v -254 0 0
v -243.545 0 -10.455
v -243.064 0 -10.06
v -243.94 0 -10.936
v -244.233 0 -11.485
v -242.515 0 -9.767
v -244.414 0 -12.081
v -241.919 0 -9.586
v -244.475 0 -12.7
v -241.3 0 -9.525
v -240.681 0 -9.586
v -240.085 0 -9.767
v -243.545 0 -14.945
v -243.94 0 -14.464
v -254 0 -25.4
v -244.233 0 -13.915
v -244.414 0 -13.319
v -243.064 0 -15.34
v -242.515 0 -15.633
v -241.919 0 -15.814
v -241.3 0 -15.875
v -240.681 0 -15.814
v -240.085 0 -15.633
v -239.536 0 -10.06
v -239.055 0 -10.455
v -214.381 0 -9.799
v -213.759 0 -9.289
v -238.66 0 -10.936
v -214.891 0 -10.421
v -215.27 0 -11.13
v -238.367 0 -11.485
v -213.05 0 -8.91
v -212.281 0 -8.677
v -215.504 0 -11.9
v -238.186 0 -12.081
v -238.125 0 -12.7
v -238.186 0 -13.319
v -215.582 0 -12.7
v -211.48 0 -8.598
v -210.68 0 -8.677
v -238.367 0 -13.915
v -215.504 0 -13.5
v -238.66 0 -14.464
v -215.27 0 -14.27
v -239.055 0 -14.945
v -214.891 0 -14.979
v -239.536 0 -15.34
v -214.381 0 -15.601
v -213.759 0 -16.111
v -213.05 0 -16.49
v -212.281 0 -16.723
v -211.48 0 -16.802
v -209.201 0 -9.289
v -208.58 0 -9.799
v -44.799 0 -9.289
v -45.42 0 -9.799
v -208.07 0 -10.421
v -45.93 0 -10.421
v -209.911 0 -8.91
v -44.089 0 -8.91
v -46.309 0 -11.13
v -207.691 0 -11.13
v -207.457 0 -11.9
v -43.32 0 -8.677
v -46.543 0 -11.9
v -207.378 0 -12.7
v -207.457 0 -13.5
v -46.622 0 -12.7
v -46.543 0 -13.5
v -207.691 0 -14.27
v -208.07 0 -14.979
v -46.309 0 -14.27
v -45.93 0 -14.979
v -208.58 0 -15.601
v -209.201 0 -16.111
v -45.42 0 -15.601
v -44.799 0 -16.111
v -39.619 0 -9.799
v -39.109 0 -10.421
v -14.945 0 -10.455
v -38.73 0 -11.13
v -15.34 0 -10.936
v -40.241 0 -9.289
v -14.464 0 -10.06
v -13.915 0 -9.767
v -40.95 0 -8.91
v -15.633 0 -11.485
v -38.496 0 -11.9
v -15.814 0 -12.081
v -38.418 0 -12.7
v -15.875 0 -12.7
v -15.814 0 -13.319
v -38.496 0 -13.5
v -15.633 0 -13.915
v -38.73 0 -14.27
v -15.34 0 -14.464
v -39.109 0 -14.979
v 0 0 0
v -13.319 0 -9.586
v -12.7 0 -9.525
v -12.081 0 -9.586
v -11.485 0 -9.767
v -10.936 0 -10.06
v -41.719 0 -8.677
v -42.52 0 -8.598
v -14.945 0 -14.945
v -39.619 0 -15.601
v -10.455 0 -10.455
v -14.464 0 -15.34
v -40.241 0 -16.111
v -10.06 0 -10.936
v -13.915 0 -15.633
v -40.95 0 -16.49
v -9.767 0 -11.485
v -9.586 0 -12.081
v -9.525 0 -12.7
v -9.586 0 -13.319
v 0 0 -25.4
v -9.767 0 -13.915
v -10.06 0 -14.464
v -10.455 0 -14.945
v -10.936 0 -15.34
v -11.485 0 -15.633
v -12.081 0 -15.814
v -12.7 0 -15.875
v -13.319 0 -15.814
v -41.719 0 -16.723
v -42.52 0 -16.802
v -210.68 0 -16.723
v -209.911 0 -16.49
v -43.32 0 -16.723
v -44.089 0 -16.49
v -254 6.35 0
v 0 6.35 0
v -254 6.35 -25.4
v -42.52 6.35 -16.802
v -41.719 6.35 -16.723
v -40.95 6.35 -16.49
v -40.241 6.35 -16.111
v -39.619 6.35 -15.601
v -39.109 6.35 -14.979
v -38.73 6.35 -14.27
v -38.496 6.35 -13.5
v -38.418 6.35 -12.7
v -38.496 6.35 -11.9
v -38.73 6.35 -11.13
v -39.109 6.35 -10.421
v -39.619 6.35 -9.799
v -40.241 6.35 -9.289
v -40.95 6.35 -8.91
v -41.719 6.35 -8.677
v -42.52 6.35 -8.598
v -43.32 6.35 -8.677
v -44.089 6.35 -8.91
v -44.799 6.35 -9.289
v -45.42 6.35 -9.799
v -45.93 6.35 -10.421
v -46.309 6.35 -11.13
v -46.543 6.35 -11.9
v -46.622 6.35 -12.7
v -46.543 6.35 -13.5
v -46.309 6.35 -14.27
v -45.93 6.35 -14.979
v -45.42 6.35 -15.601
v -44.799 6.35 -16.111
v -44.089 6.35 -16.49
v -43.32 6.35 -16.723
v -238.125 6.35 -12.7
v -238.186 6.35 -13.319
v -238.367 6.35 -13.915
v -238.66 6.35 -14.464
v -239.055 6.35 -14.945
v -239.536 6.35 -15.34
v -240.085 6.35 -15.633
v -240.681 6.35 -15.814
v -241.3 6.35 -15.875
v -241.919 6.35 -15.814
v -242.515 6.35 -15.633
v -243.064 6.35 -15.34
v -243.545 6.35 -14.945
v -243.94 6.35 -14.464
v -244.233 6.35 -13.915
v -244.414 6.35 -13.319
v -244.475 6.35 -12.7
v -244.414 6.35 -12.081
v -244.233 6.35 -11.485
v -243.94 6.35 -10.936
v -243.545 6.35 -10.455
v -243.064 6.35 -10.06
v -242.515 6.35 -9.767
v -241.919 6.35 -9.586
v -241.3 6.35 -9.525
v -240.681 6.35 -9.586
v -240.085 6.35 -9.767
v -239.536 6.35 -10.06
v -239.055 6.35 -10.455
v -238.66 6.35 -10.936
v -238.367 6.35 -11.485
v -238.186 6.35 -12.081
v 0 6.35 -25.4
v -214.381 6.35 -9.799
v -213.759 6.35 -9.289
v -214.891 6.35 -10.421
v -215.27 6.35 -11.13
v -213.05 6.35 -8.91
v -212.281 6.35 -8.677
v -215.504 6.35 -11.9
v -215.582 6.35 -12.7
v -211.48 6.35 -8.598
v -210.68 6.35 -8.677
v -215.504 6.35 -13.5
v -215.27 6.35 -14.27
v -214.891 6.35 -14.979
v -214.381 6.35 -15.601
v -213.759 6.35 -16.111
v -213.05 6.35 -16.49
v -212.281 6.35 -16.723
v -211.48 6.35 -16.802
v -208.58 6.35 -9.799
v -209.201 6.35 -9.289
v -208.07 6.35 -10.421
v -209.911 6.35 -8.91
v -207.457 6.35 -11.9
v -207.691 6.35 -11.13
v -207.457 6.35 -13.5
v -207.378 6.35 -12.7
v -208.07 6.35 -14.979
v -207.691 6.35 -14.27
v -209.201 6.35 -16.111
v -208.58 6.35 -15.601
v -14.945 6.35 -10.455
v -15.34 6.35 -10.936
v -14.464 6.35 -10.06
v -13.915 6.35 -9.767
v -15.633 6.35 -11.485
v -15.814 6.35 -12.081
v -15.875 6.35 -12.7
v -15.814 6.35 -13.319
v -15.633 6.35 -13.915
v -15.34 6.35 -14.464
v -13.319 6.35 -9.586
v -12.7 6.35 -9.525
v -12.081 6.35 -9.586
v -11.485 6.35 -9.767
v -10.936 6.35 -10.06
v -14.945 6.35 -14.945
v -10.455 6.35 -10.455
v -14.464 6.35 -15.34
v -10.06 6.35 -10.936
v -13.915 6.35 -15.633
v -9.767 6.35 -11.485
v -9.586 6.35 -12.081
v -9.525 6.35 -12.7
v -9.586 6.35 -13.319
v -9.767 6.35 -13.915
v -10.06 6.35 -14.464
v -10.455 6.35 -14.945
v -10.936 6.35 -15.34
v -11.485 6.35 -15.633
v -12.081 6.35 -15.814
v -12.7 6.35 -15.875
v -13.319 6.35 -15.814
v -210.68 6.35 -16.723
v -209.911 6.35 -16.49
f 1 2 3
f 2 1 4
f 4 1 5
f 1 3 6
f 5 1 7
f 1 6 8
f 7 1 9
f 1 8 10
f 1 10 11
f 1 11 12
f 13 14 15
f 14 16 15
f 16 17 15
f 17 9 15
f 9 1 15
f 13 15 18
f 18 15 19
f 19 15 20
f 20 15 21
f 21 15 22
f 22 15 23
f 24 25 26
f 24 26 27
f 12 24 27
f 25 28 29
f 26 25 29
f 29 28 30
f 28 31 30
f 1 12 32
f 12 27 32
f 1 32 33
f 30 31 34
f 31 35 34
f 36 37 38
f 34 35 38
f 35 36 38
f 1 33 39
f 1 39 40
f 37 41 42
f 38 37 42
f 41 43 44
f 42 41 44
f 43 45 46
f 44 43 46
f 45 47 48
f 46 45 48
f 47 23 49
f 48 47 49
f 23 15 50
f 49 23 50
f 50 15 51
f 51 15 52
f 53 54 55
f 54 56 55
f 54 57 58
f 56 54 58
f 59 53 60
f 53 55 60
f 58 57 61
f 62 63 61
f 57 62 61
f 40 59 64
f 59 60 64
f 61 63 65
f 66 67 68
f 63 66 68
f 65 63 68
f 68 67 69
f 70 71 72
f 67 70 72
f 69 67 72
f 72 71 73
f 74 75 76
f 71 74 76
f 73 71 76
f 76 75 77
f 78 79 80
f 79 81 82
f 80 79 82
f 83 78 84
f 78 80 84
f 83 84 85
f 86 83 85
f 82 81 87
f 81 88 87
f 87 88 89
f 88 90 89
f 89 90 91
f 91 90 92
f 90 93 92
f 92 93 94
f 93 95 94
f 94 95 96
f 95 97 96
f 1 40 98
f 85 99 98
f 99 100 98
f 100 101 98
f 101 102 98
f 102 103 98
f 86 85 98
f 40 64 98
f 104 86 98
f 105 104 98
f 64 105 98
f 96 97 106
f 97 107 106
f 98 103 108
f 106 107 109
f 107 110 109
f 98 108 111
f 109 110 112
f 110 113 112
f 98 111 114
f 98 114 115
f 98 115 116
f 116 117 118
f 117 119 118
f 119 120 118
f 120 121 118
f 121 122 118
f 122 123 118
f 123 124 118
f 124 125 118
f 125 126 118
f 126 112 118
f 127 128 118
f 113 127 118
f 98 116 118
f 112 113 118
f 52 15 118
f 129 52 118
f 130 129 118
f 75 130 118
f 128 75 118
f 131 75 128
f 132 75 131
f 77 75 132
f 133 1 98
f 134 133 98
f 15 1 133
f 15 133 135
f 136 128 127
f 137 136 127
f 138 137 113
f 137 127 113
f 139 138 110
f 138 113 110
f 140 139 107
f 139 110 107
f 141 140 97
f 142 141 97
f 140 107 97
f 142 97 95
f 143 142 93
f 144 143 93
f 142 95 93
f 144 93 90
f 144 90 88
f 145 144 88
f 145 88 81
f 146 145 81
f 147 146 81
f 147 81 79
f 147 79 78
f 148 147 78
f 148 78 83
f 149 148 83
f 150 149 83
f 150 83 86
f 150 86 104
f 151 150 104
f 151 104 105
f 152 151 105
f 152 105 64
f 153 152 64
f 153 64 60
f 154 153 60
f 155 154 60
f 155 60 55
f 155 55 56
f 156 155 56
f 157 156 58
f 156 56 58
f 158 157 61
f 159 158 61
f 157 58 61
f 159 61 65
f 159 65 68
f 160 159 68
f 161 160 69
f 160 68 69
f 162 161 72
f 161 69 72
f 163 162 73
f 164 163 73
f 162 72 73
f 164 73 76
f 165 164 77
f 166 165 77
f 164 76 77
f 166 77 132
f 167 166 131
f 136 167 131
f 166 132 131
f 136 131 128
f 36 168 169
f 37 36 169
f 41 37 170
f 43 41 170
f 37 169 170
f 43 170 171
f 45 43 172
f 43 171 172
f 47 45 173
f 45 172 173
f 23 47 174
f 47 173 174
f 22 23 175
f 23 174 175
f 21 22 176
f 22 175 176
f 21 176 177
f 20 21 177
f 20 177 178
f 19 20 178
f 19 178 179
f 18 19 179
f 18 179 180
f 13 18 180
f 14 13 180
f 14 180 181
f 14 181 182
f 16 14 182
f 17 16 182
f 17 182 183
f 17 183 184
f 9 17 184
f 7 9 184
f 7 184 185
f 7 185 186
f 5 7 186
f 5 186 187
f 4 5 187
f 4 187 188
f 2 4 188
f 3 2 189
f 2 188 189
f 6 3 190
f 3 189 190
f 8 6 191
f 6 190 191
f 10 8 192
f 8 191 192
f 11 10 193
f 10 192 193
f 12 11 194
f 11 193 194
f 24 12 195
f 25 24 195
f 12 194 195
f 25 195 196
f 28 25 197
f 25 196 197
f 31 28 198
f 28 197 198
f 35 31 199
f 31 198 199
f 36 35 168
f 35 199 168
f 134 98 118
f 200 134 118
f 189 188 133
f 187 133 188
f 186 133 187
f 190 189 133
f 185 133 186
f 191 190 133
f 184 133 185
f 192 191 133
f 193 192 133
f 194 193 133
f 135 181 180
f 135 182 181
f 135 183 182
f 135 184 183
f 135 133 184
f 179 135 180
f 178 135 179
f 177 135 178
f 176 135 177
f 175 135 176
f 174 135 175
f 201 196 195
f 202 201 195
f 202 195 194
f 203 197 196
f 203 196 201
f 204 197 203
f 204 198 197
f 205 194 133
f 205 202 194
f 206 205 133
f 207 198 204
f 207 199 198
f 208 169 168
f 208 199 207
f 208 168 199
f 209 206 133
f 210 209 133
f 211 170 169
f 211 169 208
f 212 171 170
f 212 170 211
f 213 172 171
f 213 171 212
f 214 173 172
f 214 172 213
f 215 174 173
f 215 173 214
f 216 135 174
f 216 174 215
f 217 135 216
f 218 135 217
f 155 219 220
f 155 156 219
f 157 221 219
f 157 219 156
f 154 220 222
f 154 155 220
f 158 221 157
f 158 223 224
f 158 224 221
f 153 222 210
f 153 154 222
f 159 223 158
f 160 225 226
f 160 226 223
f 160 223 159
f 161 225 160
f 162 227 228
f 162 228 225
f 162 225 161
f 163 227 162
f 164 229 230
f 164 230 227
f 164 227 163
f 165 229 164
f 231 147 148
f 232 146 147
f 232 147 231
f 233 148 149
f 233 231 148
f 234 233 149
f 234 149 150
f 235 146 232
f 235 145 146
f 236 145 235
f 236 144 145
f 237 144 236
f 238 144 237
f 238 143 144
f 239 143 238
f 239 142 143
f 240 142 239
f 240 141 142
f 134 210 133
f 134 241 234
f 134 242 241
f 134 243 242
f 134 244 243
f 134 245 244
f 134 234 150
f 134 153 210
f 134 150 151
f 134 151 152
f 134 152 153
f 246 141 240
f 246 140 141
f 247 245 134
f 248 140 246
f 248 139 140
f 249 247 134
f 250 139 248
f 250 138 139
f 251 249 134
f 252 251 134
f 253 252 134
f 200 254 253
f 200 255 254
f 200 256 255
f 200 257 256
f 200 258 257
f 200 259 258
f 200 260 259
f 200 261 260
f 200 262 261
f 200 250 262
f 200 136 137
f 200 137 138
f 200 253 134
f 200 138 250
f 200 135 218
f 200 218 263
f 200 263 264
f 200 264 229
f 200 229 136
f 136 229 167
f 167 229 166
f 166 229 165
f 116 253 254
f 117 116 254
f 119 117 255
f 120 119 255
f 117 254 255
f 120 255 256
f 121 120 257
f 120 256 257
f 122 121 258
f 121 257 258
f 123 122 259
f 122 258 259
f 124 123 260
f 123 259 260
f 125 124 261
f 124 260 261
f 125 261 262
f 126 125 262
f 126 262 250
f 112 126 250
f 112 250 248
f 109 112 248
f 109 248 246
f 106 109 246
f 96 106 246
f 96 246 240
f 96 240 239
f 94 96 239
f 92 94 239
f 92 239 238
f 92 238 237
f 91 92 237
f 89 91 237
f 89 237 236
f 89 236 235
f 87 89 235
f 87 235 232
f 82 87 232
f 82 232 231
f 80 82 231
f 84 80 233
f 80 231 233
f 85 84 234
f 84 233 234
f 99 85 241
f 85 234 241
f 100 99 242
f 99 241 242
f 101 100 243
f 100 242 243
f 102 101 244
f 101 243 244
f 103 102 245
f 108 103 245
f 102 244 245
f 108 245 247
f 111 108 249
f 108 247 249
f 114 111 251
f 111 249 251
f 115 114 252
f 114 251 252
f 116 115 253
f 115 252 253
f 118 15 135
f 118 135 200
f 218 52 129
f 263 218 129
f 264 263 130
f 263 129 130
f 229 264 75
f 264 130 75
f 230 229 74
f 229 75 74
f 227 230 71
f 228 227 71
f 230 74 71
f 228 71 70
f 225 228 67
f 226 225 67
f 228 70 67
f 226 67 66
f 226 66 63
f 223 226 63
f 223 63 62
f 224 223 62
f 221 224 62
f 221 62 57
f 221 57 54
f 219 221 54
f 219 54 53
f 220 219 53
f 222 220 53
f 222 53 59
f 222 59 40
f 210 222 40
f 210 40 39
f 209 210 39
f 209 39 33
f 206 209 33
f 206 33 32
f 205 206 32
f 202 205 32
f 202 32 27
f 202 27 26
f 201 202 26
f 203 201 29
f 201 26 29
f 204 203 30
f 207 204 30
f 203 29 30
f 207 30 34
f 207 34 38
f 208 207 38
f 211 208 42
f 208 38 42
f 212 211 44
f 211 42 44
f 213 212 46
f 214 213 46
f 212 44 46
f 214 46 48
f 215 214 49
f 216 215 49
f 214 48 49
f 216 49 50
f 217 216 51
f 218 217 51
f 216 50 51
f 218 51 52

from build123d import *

# Parameters (mm, degrees)
SKETCH1_W                   = 254
SKETCH1_H                   = 25.4
BOSS_EXTRUDE1_DEPTH         = 6.35
SKETCH4_R                   = 4.1021
CUT_EXTRUDE4_DEPTH          = 256.345809639
F_1_4_0_25_DIAMETER_HOLE1_D = 6.35


with BuildPart() as part:
    # Sketch1 → Boss-Extrude1 (new body)
    with BuildSketch(Plane(origin=(0, 0, 0), x_dir=(1, 0, 0), z_dir=(0, 1, 0))):
        with Locations((-127, 12.7)):
            Rectangle(SKETCH1_W, SKETCH1_H)
    extrude(amount=BOSS_EXTRUDE1_DEPTH)

    # Sketch4 → Cut-Extrude4 (cut, through all)
    with BuildSketch(Plane.XZ):
        with Locations(Location((-211.4804, -12.7, 0), (0, 0, 270))):
            Circle(SKETCH4_R)
        with Locations(Location((-42.5196, -12.7, 0), (0, 0, 270))):
            Circle(SKETCH4_R)
    extrude(amount=-CUT_EXTRUDE4_DEPTH, mode=Mode.SUBTRACT)

    # 1/4 (0.25) Diameter Hole1 (through all)
    with Locations(Plane(origin=(0, 0, 0), x_dir=(-1, 0, 0), z_dir=(0, -1, 0))):
        with Locations((241.3, 12.7), (12.7, 12.7)):
            Hole(F_1_4_0_25_DIAMETER_HOLE1_D / 2)


solid = part.part
